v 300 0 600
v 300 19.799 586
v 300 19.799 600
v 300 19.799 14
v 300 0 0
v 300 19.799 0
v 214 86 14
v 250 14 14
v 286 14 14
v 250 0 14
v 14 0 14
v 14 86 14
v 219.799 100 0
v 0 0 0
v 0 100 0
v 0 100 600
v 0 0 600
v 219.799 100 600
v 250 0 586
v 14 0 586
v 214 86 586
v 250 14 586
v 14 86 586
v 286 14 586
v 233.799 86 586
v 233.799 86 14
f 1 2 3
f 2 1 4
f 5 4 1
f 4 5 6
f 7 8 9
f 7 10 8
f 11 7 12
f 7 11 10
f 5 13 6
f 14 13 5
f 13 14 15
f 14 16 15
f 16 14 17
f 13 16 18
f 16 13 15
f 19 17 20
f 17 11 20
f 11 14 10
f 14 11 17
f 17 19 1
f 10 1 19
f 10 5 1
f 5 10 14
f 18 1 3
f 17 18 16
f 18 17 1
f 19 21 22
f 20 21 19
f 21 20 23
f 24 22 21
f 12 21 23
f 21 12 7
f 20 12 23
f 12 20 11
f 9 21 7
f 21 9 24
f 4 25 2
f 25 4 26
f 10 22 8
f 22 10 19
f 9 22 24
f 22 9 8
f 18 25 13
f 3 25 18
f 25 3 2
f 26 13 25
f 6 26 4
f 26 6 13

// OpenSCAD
/*

    Door
    
    By Anton Augustsson


*/

// use dovtail library

module door (
    thicknessBottom,
    thicknessSide,
    thicknessFront,
    lenghtDoor,
    widthDoor,
    heightDoor,
    xDoor,yDoor,zDoor,
    yRotate
    ){
/*
    ---------- Local varibles ---------- 
*/

length = lenghtDoor;
width  = widthDoor;
height = heightDoor;

widthHandal = 50;
        
x=xDoor;
y=yDoor;
z=zDoor;

/*
    ---------- Code ---------- 
*/

//rotate([0,0,0])  0,0,0
//rotate([0,180,0])  0,0,height
translate([
    x,
    y,
    z]) 
rotate([0,yRotate,0])
difference () {
union () {


// Bottom 
color("Wheat")
translate([
    0,
    0,
    0]) 
cube(size = [
    width,
    length,
    thicknessBottom]);


// top
color("Wheat")
translate([
    0,
    0,
    height-thicknessBottom]) 
cube(size = [
    width,
    length,
    thicknessBottom]);


// Back
color("BurlyWood")
translate([
    0,
    length-thicknessSide,
    0]) 
cube(size = [
    width,
    thicknessSide,
    height]);    


// Side not angle
color("Wheat")
translate([
    0,
    0,
    thicknessBottom]) 
cube(size = [
    thicknessSide,
    length,
    height-thicknessBottom*2]); //

// Side angle
color("Wheat")
translate([
    width,
    0,
    thicknessBottom]) 
rotate([0,0,45])
cube(size = [
    thicknessSide,
    sqrt(length*length*2),
    height-thicknessBottom*2]); //

// Back
color("BurlyWood")
translate([
    width-widthHandal,
    0,
    0]) 
cube(size = [
    widthHandal,
    thicknessSide,
    height]);    

}

// removal
union () {
translate([
    width+sqrt(thicknessSide*thicknessSide*2),
    0,
    -1]) 
rotate([0,0,45])
cube(size = [
    length*sin(45),
    sqrt(length*length*2),
    height+2]); //

translate([
    width,
    0,
    -1]) 
cube(size = [
    thicknessSide,
    length,
    height+2]); //

translate([
    0,
    length,
    0]) 
cube(size = [
    width,
    thicknessSide,
    height]);    
}

}}


    
/*
    ---------- Example ---------- 
*/


thicknessBottom = 14;
thicknessSide   = 14;
thicknessFront  = 20;

length = 100;
width  = 300;
height = 600;


x=0;
y=0;
z=0;
yRotate=0;

door (
    thicknessBottom,
    thicknessSide,
    thicknessFront,
    length,
    width,
    height,
    x,y,z,
    yRotate
    );
